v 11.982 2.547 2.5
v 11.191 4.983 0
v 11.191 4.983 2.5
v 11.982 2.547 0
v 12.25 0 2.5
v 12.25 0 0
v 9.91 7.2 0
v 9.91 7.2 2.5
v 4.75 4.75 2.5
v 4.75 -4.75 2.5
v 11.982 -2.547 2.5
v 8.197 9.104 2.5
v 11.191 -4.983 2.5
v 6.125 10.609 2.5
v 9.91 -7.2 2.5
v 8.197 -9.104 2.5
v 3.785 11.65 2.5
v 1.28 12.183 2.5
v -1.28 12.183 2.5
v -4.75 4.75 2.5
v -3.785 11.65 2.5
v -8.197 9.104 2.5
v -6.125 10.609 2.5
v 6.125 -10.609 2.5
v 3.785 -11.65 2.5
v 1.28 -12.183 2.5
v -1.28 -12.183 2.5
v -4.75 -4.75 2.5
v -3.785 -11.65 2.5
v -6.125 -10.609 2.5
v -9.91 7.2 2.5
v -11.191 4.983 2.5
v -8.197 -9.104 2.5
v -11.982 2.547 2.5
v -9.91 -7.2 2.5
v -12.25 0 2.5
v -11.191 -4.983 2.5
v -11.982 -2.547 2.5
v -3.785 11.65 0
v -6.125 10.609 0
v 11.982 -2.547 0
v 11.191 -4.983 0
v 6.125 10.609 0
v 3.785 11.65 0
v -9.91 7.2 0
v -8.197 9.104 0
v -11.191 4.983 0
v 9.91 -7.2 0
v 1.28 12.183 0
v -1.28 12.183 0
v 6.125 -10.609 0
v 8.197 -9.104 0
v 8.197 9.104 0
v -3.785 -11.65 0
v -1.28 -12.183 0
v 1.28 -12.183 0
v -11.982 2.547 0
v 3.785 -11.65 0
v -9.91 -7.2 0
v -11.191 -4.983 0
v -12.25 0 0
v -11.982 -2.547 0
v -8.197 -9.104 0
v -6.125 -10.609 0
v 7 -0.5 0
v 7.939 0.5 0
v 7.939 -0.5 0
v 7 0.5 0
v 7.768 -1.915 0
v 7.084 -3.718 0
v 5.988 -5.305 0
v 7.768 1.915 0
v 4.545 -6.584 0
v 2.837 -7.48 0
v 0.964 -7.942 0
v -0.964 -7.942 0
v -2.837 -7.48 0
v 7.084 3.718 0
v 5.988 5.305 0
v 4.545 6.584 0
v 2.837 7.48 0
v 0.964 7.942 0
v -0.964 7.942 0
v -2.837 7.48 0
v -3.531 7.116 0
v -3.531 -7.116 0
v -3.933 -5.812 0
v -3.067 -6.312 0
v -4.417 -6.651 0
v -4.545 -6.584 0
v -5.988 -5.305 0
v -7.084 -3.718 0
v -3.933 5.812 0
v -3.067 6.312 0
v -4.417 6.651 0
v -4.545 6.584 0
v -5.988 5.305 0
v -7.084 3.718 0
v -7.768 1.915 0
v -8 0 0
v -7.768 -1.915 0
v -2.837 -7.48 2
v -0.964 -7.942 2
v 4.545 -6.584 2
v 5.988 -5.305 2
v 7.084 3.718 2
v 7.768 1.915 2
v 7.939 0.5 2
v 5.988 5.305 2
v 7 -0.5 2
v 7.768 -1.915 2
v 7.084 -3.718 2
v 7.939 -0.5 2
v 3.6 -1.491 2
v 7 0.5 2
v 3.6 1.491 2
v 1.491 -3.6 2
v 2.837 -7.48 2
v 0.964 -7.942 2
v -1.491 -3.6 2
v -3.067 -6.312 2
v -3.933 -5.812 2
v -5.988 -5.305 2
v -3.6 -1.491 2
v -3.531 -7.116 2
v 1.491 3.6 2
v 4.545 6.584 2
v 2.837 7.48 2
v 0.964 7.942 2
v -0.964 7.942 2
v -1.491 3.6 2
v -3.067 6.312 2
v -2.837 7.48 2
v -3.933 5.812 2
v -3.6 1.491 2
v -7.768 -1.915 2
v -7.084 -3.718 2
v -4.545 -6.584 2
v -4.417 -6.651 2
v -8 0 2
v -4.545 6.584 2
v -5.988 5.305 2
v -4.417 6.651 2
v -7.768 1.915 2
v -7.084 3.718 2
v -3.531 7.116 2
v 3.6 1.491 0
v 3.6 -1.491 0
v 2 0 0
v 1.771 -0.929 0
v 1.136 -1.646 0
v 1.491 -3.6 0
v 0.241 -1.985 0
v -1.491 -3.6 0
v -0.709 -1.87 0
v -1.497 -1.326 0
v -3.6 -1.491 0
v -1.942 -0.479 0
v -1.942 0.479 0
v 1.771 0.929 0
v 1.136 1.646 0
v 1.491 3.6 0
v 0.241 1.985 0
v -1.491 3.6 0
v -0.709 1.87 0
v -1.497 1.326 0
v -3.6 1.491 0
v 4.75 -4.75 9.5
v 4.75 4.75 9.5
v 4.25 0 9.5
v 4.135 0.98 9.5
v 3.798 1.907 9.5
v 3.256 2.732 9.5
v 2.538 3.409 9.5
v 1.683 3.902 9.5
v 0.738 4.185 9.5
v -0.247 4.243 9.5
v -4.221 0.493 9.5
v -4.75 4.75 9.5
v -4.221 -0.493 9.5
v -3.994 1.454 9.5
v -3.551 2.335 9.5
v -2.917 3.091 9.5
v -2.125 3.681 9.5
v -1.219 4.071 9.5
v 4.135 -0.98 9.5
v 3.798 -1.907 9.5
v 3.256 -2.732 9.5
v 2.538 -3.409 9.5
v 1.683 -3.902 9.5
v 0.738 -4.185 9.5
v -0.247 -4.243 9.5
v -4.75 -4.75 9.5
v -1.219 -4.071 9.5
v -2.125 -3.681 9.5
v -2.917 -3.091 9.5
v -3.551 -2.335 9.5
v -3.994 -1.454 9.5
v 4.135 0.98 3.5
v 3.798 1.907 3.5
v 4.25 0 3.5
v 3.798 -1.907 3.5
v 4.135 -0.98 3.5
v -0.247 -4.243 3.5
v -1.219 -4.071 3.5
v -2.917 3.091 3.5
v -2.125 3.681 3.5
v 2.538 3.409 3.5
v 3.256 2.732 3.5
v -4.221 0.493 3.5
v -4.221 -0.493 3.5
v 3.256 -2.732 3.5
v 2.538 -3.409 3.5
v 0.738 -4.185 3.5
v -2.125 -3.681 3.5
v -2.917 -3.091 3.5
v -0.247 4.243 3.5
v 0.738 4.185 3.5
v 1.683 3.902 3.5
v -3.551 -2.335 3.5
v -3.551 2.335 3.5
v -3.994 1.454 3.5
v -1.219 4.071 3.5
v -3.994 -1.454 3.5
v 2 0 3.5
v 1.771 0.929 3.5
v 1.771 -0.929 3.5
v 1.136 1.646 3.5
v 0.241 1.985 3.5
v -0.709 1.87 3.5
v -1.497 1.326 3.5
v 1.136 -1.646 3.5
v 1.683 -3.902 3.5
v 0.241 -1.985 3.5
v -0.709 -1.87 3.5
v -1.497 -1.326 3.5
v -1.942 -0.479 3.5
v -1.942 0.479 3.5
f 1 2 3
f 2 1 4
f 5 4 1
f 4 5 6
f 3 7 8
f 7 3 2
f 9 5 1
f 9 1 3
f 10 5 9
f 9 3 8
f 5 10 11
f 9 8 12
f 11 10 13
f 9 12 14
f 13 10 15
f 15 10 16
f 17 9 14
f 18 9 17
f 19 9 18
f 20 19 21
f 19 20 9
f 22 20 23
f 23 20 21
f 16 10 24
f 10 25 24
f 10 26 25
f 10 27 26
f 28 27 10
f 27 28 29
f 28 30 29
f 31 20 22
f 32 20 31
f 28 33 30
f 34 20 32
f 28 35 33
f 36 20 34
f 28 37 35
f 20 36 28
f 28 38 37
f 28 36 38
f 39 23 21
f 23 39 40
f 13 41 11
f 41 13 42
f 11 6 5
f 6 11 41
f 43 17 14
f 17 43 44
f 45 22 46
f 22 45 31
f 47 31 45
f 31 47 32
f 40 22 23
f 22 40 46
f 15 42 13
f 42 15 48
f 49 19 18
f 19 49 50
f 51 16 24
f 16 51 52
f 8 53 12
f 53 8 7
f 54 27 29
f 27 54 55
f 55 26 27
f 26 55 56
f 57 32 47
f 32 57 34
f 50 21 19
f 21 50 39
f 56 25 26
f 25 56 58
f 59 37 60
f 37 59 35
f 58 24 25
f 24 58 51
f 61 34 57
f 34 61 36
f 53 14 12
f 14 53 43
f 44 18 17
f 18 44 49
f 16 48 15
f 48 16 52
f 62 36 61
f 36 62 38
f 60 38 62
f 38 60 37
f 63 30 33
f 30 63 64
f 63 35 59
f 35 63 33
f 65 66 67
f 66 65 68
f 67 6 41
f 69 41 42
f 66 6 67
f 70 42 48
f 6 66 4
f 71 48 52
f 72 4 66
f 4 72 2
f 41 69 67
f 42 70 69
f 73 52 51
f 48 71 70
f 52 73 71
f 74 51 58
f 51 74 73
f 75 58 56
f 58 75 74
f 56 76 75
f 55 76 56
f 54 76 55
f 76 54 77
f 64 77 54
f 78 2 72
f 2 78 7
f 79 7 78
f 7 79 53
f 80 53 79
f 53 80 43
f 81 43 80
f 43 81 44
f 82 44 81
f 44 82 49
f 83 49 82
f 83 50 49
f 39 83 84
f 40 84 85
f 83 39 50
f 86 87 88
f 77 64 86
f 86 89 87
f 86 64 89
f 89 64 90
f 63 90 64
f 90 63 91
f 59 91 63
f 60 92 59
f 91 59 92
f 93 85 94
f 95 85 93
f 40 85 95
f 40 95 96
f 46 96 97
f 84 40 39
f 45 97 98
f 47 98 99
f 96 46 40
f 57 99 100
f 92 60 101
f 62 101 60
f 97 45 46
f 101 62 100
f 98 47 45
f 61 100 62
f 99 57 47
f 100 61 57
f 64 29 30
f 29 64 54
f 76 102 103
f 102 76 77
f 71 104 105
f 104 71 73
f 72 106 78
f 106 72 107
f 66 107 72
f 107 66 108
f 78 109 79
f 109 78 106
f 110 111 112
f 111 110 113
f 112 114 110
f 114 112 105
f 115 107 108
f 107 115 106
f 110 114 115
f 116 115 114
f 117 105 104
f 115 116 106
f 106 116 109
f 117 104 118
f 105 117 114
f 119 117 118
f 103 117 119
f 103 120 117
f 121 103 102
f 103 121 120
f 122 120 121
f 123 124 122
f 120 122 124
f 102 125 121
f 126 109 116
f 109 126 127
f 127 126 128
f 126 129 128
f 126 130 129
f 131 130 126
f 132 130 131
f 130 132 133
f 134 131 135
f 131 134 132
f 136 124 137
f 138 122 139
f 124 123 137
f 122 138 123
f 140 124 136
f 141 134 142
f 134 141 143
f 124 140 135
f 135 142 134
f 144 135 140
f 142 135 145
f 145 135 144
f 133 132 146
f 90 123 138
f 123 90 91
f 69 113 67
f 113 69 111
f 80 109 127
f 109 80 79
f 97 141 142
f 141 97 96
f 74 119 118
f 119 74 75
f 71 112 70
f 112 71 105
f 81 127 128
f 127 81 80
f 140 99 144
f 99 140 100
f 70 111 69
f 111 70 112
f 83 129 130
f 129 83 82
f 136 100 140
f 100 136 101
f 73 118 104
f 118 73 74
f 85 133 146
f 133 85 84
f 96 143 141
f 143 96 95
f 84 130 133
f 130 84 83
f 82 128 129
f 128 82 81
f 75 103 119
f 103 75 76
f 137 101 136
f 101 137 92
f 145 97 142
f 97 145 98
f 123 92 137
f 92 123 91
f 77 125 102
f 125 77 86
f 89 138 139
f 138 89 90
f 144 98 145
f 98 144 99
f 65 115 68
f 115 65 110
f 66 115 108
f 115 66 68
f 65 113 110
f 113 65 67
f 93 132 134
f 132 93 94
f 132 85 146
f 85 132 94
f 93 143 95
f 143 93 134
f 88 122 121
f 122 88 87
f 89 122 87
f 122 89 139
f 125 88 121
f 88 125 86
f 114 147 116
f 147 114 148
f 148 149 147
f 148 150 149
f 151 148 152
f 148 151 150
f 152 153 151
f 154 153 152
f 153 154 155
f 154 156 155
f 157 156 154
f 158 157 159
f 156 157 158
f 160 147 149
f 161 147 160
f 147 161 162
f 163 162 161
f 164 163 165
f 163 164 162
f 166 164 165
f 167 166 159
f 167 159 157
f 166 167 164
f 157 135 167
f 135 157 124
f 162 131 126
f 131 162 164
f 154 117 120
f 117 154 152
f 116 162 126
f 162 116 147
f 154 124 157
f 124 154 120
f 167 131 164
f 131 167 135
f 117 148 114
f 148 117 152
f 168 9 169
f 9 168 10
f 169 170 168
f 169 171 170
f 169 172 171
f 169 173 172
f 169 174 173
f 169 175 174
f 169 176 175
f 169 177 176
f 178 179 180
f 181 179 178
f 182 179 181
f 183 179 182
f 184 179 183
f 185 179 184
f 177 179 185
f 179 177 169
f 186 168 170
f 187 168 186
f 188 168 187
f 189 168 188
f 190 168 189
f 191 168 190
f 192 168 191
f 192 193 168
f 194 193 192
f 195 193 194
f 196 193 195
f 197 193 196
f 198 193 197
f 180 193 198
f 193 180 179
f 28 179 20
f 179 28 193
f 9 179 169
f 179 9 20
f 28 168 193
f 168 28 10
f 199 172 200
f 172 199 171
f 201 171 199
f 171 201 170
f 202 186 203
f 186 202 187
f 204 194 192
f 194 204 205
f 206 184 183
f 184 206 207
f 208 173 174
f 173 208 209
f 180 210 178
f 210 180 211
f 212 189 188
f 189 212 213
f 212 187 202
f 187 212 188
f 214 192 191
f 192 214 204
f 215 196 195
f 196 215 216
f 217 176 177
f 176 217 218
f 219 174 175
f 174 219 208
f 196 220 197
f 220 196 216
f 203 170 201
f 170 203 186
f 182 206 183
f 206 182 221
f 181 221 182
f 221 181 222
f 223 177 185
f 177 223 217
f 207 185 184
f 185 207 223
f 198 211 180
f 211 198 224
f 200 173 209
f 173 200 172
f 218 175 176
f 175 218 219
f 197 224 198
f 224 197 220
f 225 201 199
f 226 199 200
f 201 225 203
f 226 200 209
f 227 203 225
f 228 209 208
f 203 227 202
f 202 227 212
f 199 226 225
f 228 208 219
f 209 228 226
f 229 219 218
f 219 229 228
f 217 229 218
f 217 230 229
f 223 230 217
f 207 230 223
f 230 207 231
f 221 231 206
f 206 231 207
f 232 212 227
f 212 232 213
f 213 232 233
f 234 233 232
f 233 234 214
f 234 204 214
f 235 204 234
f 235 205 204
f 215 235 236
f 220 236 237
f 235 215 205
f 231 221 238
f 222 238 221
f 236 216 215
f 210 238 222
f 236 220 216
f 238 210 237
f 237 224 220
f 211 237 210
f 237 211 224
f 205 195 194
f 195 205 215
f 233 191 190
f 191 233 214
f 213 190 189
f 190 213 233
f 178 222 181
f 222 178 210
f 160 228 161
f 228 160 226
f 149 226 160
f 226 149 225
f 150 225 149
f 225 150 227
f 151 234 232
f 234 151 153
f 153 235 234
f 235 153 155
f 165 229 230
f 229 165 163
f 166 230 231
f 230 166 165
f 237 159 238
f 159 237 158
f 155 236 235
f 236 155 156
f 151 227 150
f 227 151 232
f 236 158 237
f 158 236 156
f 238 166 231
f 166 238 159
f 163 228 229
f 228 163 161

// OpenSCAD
difference()
{
  union()
  {
    // main cylinder
    difference()
    {
      cylinder(r=24.5/2, h=2.5);
      cylinder(r=16/2, h=2);
    }
    
    // 3 side blockers
    for(angle = [0, 120, 240])
      rotate([0, 0, angle])
        translate([-1/2, -1/2, 0] + [16/2-1/2, 0, 0])
          cube([1, 1, 2]);
    
    // main screw mount - bottom part
    intersection()
    {
      int_cube_size=7.2;
      rotate([0, 0, 0])
        translate([-int_cube_size/2, -int_cube_size/2, 0])
          cube([int_cube_size, int_cube_size, 2]);
      rotate([0, 0, 45])
        translate([-int_cube_size/2, -int_cube_size/2, 0])
          cube([int_cube_size, int_cube_size, 2]);
    }
    
    // main screw mount - top part
    {
      int_cube_size=9.5;
      translate([-int_cube_size/2, -int_cube_size/2, 0] + [0, 0, 2.5])
        cube([int_cube_size, int_cube_size, 7]);
    }
  }
  // screw hole
  translate([0, 0, 2.5+1])
    cylinder(r=(7+1.5)/2, h=7-1, $fs=1);
  cylinder(r=4/2, h=12, $fs=1);
}
